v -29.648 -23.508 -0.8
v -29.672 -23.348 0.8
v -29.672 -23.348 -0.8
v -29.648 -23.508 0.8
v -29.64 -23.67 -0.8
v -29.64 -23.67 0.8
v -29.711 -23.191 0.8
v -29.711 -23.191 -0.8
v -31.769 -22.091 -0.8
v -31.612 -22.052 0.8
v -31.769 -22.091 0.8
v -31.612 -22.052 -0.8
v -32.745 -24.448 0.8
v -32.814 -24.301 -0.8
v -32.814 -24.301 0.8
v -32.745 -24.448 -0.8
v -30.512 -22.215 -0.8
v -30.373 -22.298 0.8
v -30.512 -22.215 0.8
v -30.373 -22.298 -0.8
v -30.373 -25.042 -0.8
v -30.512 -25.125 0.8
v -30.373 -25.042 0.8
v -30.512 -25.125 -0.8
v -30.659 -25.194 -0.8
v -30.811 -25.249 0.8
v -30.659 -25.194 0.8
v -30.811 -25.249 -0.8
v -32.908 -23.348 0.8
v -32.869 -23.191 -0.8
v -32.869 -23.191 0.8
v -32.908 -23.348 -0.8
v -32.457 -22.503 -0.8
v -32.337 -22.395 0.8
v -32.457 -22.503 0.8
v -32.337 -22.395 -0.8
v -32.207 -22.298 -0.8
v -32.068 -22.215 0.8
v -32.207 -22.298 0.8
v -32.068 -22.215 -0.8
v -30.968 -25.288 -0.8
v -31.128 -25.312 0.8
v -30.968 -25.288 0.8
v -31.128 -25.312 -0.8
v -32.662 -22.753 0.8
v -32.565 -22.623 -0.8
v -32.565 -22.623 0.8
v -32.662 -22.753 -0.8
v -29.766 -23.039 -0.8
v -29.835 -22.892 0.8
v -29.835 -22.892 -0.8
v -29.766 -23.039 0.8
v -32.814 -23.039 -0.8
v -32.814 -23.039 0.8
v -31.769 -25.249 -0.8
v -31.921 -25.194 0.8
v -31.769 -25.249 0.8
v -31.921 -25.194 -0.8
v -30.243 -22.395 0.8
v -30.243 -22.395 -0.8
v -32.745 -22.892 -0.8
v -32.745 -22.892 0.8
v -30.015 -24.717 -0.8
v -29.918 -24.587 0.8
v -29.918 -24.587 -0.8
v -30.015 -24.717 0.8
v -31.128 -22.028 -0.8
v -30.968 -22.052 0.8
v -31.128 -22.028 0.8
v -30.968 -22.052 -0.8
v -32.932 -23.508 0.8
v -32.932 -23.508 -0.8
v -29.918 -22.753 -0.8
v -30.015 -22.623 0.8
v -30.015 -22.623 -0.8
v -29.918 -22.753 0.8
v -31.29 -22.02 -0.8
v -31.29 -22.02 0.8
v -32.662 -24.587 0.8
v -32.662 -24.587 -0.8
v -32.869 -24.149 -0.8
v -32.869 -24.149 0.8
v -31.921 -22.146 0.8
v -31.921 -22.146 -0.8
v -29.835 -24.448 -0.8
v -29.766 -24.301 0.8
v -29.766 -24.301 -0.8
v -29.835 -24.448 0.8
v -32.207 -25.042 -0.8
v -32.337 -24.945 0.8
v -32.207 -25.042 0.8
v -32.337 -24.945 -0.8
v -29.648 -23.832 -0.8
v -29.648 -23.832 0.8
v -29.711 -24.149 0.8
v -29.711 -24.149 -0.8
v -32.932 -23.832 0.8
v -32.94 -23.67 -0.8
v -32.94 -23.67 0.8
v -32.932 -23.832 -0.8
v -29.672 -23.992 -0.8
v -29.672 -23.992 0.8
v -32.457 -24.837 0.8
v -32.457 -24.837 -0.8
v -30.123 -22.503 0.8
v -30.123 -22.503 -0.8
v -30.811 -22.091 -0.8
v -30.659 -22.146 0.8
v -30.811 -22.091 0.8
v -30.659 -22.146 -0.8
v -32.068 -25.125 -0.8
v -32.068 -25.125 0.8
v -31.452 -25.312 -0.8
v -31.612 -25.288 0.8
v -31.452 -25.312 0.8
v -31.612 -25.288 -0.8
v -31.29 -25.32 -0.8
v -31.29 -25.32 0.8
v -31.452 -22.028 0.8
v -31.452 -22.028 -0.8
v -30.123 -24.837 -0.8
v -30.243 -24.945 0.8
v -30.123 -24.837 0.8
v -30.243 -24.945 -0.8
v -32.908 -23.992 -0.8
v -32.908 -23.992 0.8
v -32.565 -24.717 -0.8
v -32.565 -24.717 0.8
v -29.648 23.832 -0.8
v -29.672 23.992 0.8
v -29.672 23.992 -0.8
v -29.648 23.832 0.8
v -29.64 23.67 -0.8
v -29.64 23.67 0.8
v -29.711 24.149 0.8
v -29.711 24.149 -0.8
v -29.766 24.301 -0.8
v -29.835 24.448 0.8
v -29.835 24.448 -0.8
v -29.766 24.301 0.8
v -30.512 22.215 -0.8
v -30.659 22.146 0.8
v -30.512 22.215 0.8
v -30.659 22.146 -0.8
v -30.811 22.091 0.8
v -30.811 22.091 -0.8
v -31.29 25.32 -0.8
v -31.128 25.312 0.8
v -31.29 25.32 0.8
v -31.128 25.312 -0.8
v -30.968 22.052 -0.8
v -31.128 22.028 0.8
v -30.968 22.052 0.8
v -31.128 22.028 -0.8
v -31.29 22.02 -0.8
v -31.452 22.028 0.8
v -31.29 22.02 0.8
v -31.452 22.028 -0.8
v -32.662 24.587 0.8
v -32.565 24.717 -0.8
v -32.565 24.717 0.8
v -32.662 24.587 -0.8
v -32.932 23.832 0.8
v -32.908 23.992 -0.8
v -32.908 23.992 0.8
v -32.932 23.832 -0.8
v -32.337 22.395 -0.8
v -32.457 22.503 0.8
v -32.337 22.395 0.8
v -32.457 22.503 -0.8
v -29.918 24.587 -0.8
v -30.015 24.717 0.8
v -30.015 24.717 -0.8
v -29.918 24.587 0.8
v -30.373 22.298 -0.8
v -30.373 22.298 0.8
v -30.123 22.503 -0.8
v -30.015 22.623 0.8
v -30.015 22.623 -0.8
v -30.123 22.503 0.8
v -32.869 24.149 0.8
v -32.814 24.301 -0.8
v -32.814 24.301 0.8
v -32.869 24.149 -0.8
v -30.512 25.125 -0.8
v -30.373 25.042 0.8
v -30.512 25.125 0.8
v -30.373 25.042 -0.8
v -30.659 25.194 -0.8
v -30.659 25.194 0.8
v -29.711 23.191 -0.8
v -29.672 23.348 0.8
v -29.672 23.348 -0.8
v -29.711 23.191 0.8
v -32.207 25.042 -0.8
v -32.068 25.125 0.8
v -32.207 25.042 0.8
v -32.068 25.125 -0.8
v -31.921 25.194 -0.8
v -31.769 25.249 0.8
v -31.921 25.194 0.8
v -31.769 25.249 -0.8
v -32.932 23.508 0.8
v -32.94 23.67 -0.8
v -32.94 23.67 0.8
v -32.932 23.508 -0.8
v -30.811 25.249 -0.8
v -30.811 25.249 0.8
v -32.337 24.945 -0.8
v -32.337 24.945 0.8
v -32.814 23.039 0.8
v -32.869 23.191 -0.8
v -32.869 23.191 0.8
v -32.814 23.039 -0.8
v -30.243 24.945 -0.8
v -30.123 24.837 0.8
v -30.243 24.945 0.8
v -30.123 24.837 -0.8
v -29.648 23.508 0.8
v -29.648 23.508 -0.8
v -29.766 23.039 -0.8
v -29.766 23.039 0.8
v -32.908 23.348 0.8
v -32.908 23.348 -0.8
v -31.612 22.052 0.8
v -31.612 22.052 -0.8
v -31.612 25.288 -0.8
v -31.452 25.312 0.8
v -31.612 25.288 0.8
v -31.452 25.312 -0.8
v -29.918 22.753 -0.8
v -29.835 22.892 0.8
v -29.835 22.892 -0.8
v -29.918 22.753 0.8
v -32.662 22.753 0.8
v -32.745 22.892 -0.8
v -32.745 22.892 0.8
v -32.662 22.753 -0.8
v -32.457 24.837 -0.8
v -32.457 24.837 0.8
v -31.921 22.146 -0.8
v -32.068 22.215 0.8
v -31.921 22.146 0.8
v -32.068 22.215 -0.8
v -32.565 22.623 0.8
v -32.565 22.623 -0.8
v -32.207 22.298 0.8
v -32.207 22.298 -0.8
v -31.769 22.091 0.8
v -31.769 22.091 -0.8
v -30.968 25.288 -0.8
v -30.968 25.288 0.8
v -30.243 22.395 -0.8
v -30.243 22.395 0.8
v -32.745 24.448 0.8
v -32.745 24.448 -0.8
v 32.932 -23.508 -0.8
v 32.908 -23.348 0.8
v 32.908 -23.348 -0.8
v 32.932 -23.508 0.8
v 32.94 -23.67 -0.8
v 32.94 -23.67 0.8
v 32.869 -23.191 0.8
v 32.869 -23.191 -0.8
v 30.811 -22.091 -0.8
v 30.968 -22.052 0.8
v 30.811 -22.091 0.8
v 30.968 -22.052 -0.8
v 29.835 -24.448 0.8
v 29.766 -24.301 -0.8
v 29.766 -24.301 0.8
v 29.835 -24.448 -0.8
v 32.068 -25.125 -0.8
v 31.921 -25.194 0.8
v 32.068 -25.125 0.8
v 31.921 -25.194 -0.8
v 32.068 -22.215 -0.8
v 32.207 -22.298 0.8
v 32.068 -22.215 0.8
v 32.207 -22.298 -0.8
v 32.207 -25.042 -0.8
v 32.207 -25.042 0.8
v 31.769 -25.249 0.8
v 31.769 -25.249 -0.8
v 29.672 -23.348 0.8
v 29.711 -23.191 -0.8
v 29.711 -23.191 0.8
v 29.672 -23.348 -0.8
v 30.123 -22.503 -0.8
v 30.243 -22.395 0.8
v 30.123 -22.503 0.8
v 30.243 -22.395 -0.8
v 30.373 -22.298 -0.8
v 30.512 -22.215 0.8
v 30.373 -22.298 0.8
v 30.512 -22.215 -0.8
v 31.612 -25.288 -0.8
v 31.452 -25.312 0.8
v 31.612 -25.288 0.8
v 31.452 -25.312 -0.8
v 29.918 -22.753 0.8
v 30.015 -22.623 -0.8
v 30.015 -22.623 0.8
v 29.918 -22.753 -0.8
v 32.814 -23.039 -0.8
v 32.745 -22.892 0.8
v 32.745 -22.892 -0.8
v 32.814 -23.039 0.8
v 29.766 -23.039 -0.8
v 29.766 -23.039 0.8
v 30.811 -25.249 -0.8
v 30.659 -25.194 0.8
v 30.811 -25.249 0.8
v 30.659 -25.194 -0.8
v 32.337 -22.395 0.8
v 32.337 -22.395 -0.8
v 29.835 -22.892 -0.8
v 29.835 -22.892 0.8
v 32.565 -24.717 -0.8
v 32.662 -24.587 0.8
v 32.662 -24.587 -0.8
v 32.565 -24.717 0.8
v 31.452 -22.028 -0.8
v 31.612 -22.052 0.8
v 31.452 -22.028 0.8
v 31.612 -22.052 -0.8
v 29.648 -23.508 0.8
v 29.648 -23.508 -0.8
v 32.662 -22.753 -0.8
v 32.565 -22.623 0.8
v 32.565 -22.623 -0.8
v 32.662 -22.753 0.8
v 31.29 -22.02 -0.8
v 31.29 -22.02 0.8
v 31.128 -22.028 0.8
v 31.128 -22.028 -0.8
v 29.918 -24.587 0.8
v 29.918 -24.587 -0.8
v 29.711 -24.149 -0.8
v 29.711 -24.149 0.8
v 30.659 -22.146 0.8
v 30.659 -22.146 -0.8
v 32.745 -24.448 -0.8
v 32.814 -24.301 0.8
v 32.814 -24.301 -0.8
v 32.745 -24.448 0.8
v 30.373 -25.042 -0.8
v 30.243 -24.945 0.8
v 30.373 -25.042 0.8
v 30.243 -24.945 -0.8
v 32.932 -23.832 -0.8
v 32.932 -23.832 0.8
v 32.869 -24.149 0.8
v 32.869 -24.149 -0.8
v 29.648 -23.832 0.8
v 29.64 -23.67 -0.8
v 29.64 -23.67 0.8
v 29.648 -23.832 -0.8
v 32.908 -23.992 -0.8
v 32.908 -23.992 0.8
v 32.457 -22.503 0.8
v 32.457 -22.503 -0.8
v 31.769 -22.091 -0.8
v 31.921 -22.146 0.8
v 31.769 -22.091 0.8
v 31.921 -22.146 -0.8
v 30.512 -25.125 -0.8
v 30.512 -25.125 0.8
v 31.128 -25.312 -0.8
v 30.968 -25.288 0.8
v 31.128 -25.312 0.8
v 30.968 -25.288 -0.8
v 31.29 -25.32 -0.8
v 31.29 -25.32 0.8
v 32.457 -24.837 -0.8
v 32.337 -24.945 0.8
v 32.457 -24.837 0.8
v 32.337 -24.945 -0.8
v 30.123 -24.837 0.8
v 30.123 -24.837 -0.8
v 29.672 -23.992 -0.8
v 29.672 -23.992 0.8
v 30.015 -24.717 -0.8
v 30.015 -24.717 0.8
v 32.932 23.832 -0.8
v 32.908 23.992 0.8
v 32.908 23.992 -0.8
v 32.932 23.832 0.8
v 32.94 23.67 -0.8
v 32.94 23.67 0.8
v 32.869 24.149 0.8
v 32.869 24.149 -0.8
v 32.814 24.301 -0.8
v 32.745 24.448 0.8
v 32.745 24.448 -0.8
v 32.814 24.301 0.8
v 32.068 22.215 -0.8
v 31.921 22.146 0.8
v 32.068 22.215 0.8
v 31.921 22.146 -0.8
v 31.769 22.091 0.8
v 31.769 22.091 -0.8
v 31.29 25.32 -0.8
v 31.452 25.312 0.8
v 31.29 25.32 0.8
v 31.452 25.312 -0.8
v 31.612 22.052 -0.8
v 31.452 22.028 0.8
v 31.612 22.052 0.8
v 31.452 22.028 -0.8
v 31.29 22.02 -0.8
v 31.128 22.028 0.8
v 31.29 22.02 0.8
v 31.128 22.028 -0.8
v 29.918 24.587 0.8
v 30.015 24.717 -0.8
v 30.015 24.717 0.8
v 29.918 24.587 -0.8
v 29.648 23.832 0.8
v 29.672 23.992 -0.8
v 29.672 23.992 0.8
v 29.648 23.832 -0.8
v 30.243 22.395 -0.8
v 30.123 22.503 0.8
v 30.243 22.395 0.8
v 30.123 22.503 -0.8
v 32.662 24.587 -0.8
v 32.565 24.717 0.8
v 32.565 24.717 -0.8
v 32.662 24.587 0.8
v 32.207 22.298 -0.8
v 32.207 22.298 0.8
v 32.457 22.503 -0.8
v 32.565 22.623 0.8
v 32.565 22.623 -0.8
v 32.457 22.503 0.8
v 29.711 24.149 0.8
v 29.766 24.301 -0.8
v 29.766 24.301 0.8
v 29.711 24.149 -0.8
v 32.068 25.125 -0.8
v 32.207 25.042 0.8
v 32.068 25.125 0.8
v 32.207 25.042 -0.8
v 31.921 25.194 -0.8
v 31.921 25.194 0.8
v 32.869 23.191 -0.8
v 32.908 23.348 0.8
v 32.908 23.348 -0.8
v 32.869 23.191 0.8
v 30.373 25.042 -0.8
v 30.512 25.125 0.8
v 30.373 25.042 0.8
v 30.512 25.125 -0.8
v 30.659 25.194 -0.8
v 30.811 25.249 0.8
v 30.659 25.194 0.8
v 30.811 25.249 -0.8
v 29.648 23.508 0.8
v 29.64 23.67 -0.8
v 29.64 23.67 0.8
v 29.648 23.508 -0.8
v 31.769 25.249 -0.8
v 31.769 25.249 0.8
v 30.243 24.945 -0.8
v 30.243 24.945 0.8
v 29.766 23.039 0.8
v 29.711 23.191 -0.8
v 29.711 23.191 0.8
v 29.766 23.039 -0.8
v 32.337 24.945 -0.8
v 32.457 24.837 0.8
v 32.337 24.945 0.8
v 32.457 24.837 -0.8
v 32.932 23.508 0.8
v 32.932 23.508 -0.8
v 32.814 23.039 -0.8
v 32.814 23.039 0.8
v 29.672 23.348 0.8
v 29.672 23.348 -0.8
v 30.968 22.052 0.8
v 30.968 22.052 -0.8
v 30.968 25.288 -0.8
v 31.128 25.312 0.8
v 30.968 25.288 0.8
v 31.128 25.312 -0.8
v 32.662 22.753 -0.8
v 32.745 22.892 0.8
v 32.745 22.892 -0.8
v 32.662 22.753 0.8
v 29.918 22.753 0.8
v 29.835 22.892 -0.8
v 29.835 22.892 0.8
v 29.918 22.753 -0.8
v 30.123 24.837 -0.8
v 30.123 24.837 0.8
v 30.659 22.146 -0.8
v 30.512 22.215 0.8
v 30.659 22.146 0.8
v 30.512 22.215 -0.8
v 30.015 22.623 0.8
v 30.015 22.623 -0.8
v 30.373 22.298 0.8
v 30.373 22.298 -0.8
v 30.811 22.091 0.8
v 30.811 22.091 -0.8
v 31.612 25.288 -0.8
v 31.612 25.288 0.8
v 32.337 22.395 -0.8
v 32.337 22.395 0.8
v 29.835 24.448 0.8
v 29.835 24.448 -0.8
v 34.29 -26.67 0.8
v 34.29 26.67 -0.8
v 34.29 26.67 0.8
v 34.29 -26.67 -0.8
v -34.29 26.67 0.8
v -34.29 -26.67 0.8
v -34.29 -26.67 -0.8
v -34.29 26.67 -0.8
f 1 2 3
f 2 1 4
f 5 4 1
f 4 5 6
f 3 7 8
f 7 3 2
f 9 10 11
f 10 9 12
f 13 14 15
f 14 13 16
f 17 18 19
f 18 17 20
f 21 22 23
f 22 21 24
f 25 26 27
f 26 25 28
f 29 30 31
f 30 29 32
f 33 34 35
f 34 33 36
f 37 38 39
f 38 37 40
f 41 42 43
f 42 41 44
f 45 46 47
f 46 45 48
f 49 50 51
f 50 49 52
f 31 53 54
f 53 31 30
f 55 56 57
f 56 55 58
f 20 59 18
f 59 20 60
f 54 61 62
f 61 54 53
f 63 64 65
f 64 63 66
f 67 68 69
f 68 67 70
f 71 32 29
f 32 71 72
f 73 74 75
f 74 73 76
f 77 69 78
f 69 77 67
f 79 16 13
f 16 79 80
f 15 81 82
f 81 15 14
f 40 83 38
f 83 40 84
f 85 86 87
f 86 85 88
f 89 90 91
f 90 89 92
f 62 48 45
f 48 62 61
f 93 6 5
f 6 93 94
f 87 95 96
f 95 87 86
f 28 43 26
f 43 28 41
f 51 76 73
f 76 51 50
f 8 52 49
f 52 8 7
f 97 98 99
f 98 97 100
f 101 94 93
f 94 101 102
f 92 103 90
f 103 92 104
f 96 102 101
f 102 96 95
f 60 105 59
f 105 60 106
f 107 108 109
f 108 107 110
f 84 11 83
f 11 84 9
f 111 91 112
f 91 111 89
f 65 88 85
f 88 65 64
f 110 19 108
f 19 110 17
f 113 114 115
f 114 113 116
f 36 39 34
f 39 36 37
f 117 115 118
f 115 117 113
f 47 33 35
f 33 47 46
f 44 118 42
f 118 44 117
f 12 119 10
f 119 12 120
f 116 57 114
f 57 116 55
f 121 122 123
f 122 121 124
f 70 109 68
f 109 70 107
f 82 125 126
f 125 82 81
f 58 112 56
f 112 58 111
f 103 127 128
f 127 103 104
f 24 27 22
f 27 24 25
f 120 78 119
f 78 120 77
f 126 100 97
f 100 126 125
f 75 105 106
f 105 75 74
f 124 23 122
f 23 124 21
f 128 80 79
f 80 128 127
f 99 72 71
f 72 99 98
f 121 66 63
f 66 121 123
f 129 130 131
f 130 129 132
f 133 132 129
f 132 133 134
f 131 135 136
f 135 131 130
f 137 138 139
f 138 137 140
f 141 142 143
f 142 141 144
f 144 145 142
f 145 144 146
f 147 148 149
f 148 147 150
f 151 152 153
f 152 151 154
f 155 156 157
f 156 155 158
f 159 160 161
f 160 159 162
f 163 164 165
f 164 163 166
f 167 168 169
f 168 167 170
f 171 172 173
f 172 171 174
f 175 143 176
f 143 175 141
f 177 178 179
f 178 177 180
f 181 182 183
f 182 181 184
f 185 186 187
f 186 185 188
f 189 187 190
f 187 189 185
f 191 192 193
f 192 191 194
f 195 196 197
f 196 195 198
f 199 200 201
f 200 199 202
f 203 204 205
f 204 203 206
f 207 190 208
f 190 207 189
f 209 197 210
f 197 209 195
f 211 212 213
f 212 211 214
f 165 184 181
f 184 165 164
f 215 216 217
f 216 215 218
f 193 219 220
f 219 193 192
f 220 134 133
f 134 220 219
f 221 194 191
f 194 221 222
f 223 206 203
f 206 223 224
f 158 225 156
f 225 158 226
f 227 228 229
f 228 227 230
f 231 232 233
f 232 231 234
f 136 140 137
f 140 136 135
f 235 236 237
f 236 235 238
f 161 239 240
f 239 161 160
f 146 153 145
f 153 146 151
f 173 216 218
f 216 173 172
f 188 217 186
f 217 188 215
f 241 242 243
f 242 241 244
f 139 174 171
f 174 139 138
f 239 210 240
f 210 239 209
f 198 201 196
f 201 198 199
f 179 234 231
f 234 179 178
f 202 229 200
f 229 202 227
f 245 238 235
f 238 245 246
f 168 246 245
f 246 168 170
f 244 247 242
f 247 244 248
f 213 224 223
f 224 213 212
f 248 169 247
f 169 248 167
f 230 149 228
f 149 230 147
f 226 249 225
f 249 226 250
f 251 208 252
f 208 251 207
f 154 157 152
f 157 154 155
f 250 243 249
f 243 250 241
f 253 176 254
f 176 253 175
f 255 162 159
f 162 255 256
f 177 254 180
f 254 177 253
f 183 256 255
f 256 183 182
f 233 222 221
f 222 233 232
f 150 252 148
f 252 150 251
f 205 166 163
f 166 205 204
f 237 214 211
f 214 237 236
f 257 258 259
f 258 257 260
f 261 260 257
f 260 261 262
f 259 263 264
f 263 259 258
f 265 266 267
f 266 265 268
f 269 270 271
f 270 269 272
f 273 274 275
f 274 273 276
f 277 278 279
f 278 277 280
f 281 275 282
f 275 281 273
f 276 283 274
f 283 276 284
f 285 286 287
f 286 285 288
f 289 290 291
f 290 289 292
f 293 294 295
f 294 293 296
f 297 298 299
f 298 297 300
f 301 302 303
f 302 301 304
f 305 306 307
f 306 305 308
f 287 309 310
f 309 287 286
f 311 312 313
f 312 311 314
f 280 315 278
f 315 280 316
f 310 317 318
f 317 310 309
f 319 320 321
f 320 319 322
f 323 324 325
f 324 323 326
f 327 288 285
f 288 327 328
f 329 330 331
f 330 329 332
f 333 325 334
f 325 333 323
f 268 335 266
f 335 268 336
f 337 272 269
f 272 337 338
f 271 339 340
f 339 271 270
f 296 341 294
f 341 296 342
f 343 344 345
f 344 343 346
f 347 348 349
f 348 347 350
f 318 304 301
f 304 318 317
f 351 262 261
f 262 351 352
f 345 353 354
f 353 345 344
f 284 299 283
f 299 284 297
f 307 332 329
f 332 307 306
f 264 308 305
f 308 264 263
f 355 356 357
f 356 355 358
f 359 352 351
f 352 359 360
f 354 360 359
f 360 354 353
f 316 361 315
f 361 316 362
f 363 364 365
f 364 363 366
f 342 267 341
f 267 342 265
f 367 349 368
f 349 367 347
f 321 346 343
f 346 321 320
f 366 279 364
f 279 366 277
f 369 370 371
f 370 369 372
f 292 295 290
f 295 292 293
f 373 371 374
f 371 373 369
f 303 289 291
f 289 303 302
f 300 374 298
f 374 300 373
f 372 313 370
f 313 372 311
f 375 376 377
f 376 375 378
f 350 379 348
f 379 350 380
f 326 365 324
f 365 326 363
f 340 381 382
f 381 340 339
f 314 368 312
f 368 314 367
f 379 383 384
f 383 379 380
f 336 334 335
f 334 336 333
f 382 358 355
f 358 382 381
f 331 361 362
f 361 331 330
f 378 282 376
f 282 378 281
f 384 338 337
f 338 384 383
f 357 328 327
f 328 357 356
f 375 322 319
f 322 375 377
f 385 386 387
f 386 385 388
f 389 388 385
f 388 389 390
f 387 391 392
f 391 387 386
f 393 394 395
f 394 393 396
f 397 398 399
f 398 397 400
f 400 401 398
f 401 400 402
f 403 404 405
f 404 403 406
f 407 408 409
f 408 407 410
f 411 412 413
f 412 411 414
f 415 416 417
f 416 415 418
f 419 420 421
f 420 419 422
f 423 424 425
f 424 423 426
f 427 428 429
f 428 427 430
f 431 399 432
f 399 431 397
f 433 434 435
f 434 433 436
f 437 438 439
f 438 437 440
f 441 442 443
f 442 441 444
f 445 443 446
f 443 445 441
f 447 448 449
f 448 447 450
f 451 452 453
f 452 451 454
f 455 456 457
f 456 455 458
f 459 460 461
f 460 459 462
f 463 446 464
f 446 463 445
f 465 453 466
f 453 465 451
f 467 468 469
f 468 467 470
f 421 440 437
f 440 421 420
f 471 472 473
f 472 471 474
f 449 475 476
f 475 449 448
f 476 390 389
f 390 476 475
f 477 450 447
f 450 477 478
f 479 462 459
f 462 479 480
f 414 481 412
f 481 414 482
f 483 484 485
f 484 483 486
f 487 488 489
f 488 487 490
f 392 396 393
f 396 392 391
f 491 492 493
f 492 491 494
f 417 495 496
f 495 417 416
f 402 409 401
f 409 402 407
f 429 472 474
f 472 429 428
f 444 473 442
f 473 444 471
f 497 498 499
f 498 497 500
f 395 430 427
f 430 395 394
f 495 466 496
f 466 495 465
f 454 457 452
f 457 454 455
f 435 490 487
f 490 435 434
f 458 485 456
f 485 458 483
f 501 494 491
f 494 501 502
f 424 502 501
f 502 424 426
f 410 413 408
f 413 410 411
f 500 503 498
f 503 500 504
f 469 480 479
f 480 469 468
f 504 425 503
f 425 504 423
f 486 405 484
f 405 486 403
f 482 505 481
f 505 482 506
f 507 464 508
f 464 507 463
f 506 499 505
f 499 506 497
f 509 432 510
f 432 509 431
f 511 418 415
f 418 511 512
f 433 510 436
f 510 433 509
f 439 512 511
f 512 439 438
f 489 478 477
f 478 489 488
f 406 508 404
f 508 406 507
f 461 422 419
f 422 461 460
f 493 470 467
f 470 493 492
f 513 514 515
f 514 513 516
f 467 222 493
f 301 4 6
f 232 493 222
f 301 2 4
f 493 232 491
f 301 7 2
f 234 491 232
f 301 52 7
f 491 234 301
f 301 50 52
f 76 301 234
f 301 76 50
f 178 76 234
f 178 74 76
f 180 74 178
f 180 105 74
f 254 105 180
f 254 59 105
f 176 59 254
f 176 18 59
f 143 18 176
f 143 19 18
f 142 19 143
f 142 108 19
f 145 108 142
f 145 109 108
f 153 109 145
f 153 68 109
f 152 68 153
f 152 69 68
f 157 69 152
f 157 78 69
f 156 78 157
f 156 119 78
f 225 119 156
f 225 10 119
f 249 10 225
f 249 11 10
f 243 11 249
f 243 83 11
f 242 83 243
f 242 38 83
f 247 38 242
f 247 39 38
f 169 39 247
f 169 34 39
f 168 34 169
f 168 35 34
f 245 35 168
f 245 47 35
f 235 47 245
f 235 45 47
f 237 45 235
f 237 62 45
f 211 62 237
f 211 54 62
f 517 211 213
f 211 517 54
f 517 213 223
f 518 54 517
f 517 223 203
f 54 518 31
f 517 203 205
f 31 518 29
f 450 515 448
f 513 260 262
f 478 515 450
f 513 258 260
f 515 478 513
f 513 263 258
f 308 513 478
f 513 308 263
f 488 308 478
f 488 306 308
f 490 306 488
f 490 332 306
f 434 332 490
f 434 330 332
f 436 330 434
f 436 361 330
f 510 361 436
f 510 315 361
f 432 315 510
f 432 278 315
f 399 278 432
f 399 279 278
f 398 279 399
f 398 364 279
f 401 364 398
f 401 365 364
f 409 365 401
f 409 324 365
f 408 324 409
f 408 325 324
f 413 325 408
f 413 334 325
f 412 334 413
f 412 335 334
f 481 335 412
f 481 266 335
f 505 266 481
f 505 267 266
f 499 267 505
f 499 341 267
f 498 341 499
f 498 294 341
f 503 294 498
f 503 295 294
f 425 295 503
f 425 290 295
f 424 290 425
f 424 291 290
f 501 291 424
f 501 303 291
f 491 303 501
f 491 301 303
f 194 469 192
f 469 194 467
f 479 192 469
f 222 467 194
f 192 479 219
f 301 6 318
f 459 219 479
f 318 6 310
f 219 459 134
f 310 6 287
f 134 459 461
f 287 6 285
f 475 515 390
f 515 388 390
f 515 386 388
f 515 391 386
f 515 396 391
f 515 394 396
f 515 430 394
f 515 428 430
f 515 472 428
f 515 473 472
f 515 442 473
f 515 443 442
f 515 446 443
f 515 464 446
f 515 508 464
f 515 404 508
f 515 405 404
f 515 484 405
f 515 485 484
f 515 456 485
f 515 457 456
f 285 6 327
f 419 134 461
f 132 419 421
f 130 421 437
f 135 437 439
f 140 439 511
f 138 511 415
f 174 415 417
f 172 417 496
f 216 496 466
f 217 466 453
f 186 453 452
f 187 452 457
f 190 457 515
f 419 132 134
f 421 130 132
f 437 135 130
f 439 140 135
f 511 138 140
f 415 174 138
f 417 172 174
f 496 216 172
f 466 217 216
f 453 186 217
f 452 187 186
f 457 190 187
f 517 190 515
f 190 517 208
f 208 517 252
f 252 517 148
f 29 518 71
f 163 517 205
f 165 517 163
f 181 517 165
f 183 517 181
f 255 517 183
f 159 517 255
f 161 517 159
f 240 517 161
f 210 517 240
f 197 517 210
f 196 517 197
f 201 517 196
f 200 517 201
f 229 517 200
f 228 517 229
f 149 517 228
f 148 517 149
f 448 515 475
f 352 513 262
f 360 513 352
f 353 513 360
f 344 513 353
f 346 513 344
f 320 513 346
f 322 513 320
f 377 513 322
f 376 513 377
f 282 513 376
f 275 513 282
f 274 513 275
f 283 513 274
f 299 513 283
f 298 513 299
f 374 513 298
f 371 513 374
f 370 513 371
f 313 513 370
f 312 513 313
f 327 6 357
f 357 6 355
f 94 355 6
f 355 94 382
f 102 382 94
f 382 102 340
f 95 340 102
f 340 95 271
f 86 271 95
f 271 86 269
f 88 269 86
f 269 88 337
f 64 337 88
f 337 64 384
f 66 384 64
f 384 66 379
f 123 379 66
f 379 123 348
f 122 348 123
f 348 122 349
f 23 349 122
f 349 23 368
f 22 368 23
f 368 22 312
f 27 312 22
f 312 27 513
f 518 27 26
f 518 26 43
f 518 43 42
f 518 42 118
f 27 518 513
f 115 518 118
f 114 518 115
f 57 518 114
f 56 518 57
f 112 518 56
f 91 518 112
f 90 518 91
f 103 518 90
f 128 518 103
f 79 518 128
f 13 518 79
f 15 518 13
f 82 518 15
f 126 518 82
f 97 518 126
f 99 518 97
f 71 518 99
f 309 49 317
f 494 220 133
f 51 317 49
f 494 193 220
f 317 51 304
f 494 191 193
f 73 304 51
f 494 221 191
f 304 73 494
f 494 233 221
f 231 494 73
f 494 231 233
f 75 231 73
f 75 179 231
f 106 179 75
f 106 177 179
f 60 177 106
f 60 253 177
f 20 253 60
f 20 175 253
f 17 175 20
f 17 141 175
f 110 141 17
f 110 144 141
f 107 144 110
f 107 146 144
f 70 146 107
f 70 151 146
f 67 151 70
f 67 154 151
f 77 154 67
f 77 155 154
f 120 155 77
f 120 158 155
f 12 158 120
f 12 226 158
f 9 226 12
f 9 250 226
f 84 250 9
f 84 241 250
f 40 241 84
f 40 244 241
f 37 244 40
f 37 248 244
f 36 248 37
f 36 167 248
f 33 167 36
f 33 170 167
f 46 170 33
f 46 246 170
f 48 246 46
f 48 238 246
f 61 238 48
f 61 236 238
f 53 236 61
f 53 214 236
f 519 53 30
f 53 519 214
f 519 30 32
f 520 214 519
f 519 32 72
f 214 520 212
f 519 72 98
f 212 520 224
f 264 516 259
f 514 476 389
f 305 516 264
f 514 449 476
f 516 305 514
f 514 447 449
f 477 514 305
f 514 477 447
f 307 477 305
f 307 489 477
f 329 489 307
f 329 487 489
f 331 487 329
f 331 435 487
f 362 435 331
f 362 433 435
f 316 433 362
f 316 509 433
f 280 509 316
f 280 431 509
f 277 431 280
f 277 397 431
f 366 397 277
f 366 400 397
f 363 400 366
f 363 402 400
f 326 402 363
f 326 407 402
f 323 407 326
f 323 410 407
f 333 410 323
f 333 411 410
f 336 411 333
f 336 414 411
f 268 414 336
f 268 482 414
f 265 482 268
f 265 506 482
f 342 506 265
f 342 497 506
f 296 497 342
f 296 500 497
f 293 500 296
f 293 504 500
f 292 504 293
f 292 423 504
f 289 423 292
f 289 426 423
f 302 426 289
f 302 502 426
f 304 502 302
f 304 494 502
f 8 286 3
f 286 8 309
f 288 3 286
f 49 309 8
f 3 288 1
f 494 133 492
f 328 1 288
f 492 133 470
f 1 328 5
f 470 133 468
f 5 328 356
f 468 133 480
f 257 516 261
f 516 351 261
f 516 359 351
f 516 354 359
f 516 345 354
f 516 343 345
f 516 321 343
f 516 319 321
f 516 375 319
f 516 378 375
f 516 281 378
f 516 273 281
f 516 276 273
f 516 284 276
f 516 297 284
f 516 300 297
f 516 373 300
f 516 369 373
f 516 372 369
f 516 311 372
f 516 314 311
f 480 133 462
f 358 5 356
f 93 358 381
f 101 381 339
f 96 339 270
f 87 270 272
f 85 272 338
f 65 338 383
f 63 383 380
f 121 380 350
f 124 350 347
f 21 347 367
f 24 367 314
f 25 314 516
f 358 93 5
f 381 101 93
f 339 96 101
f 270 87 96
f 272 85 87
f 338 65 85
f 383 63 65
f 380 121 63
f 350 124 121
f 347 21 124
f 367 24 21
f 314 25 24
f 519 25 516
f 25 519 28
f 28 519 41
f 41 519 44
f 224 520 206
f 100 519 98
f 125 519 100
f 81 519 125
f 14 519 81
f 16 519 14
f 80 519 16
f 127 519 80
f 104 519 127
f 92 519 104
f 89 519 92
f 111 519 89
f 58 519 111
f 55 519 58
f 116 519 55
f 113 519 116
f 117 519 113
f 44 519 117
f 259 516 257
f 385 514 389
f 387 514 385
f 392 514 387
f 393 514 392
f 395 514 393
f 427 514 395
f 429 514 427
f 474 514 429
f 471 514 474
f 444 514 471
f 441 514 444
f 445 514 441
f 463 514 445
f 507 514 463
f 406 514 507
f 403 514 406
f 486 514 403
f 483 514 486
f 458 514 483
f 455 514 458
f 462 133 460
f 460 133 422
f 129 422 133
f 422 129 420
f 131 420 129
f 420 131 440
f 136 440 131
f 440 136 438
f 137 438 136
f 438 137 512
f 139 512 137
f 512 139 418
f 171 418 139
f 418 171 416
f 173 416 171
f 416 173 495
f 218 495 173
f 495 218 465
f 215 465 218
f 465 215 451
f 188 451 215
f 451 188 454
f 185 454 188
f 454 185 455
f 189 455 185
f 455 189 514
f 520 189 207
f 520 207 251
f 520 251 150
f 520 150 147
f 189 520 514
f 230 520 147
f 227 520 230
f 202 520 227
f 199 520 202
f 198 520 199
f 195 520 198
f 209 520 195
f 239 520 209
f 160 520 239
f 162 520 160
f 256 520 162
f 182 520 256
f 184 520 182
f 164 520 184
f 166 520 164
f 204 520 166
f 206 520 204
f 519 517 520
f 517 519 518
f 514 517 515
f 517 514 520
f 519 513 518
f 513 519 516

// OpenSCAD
$fn = 64;

board_x = 68.58;
board_y = 53.34;
board_th = 1.6;

hole_d = 3.3;
hole_r = hole_d/2;

// Assume standard corner mounting holes with 3.0 mm edge offset (common practice)
hole_offset = 3.0;

module pcb() {
    difference() {
        translate([-board_x/2, -board_y/2, -board_th/2])
            cube([board_x, board_y, board_th], center=false);

        for (sx = [-1, 1], sy = [-1, 1]) {
            translate([sx*(board_x/2 - hole_offset), sy*(board_y/2 - hole_offset), 0])
                cylinder(h=board_th + 0.5, r=hole_r, center=true);
        }
    }
}

pcb();
